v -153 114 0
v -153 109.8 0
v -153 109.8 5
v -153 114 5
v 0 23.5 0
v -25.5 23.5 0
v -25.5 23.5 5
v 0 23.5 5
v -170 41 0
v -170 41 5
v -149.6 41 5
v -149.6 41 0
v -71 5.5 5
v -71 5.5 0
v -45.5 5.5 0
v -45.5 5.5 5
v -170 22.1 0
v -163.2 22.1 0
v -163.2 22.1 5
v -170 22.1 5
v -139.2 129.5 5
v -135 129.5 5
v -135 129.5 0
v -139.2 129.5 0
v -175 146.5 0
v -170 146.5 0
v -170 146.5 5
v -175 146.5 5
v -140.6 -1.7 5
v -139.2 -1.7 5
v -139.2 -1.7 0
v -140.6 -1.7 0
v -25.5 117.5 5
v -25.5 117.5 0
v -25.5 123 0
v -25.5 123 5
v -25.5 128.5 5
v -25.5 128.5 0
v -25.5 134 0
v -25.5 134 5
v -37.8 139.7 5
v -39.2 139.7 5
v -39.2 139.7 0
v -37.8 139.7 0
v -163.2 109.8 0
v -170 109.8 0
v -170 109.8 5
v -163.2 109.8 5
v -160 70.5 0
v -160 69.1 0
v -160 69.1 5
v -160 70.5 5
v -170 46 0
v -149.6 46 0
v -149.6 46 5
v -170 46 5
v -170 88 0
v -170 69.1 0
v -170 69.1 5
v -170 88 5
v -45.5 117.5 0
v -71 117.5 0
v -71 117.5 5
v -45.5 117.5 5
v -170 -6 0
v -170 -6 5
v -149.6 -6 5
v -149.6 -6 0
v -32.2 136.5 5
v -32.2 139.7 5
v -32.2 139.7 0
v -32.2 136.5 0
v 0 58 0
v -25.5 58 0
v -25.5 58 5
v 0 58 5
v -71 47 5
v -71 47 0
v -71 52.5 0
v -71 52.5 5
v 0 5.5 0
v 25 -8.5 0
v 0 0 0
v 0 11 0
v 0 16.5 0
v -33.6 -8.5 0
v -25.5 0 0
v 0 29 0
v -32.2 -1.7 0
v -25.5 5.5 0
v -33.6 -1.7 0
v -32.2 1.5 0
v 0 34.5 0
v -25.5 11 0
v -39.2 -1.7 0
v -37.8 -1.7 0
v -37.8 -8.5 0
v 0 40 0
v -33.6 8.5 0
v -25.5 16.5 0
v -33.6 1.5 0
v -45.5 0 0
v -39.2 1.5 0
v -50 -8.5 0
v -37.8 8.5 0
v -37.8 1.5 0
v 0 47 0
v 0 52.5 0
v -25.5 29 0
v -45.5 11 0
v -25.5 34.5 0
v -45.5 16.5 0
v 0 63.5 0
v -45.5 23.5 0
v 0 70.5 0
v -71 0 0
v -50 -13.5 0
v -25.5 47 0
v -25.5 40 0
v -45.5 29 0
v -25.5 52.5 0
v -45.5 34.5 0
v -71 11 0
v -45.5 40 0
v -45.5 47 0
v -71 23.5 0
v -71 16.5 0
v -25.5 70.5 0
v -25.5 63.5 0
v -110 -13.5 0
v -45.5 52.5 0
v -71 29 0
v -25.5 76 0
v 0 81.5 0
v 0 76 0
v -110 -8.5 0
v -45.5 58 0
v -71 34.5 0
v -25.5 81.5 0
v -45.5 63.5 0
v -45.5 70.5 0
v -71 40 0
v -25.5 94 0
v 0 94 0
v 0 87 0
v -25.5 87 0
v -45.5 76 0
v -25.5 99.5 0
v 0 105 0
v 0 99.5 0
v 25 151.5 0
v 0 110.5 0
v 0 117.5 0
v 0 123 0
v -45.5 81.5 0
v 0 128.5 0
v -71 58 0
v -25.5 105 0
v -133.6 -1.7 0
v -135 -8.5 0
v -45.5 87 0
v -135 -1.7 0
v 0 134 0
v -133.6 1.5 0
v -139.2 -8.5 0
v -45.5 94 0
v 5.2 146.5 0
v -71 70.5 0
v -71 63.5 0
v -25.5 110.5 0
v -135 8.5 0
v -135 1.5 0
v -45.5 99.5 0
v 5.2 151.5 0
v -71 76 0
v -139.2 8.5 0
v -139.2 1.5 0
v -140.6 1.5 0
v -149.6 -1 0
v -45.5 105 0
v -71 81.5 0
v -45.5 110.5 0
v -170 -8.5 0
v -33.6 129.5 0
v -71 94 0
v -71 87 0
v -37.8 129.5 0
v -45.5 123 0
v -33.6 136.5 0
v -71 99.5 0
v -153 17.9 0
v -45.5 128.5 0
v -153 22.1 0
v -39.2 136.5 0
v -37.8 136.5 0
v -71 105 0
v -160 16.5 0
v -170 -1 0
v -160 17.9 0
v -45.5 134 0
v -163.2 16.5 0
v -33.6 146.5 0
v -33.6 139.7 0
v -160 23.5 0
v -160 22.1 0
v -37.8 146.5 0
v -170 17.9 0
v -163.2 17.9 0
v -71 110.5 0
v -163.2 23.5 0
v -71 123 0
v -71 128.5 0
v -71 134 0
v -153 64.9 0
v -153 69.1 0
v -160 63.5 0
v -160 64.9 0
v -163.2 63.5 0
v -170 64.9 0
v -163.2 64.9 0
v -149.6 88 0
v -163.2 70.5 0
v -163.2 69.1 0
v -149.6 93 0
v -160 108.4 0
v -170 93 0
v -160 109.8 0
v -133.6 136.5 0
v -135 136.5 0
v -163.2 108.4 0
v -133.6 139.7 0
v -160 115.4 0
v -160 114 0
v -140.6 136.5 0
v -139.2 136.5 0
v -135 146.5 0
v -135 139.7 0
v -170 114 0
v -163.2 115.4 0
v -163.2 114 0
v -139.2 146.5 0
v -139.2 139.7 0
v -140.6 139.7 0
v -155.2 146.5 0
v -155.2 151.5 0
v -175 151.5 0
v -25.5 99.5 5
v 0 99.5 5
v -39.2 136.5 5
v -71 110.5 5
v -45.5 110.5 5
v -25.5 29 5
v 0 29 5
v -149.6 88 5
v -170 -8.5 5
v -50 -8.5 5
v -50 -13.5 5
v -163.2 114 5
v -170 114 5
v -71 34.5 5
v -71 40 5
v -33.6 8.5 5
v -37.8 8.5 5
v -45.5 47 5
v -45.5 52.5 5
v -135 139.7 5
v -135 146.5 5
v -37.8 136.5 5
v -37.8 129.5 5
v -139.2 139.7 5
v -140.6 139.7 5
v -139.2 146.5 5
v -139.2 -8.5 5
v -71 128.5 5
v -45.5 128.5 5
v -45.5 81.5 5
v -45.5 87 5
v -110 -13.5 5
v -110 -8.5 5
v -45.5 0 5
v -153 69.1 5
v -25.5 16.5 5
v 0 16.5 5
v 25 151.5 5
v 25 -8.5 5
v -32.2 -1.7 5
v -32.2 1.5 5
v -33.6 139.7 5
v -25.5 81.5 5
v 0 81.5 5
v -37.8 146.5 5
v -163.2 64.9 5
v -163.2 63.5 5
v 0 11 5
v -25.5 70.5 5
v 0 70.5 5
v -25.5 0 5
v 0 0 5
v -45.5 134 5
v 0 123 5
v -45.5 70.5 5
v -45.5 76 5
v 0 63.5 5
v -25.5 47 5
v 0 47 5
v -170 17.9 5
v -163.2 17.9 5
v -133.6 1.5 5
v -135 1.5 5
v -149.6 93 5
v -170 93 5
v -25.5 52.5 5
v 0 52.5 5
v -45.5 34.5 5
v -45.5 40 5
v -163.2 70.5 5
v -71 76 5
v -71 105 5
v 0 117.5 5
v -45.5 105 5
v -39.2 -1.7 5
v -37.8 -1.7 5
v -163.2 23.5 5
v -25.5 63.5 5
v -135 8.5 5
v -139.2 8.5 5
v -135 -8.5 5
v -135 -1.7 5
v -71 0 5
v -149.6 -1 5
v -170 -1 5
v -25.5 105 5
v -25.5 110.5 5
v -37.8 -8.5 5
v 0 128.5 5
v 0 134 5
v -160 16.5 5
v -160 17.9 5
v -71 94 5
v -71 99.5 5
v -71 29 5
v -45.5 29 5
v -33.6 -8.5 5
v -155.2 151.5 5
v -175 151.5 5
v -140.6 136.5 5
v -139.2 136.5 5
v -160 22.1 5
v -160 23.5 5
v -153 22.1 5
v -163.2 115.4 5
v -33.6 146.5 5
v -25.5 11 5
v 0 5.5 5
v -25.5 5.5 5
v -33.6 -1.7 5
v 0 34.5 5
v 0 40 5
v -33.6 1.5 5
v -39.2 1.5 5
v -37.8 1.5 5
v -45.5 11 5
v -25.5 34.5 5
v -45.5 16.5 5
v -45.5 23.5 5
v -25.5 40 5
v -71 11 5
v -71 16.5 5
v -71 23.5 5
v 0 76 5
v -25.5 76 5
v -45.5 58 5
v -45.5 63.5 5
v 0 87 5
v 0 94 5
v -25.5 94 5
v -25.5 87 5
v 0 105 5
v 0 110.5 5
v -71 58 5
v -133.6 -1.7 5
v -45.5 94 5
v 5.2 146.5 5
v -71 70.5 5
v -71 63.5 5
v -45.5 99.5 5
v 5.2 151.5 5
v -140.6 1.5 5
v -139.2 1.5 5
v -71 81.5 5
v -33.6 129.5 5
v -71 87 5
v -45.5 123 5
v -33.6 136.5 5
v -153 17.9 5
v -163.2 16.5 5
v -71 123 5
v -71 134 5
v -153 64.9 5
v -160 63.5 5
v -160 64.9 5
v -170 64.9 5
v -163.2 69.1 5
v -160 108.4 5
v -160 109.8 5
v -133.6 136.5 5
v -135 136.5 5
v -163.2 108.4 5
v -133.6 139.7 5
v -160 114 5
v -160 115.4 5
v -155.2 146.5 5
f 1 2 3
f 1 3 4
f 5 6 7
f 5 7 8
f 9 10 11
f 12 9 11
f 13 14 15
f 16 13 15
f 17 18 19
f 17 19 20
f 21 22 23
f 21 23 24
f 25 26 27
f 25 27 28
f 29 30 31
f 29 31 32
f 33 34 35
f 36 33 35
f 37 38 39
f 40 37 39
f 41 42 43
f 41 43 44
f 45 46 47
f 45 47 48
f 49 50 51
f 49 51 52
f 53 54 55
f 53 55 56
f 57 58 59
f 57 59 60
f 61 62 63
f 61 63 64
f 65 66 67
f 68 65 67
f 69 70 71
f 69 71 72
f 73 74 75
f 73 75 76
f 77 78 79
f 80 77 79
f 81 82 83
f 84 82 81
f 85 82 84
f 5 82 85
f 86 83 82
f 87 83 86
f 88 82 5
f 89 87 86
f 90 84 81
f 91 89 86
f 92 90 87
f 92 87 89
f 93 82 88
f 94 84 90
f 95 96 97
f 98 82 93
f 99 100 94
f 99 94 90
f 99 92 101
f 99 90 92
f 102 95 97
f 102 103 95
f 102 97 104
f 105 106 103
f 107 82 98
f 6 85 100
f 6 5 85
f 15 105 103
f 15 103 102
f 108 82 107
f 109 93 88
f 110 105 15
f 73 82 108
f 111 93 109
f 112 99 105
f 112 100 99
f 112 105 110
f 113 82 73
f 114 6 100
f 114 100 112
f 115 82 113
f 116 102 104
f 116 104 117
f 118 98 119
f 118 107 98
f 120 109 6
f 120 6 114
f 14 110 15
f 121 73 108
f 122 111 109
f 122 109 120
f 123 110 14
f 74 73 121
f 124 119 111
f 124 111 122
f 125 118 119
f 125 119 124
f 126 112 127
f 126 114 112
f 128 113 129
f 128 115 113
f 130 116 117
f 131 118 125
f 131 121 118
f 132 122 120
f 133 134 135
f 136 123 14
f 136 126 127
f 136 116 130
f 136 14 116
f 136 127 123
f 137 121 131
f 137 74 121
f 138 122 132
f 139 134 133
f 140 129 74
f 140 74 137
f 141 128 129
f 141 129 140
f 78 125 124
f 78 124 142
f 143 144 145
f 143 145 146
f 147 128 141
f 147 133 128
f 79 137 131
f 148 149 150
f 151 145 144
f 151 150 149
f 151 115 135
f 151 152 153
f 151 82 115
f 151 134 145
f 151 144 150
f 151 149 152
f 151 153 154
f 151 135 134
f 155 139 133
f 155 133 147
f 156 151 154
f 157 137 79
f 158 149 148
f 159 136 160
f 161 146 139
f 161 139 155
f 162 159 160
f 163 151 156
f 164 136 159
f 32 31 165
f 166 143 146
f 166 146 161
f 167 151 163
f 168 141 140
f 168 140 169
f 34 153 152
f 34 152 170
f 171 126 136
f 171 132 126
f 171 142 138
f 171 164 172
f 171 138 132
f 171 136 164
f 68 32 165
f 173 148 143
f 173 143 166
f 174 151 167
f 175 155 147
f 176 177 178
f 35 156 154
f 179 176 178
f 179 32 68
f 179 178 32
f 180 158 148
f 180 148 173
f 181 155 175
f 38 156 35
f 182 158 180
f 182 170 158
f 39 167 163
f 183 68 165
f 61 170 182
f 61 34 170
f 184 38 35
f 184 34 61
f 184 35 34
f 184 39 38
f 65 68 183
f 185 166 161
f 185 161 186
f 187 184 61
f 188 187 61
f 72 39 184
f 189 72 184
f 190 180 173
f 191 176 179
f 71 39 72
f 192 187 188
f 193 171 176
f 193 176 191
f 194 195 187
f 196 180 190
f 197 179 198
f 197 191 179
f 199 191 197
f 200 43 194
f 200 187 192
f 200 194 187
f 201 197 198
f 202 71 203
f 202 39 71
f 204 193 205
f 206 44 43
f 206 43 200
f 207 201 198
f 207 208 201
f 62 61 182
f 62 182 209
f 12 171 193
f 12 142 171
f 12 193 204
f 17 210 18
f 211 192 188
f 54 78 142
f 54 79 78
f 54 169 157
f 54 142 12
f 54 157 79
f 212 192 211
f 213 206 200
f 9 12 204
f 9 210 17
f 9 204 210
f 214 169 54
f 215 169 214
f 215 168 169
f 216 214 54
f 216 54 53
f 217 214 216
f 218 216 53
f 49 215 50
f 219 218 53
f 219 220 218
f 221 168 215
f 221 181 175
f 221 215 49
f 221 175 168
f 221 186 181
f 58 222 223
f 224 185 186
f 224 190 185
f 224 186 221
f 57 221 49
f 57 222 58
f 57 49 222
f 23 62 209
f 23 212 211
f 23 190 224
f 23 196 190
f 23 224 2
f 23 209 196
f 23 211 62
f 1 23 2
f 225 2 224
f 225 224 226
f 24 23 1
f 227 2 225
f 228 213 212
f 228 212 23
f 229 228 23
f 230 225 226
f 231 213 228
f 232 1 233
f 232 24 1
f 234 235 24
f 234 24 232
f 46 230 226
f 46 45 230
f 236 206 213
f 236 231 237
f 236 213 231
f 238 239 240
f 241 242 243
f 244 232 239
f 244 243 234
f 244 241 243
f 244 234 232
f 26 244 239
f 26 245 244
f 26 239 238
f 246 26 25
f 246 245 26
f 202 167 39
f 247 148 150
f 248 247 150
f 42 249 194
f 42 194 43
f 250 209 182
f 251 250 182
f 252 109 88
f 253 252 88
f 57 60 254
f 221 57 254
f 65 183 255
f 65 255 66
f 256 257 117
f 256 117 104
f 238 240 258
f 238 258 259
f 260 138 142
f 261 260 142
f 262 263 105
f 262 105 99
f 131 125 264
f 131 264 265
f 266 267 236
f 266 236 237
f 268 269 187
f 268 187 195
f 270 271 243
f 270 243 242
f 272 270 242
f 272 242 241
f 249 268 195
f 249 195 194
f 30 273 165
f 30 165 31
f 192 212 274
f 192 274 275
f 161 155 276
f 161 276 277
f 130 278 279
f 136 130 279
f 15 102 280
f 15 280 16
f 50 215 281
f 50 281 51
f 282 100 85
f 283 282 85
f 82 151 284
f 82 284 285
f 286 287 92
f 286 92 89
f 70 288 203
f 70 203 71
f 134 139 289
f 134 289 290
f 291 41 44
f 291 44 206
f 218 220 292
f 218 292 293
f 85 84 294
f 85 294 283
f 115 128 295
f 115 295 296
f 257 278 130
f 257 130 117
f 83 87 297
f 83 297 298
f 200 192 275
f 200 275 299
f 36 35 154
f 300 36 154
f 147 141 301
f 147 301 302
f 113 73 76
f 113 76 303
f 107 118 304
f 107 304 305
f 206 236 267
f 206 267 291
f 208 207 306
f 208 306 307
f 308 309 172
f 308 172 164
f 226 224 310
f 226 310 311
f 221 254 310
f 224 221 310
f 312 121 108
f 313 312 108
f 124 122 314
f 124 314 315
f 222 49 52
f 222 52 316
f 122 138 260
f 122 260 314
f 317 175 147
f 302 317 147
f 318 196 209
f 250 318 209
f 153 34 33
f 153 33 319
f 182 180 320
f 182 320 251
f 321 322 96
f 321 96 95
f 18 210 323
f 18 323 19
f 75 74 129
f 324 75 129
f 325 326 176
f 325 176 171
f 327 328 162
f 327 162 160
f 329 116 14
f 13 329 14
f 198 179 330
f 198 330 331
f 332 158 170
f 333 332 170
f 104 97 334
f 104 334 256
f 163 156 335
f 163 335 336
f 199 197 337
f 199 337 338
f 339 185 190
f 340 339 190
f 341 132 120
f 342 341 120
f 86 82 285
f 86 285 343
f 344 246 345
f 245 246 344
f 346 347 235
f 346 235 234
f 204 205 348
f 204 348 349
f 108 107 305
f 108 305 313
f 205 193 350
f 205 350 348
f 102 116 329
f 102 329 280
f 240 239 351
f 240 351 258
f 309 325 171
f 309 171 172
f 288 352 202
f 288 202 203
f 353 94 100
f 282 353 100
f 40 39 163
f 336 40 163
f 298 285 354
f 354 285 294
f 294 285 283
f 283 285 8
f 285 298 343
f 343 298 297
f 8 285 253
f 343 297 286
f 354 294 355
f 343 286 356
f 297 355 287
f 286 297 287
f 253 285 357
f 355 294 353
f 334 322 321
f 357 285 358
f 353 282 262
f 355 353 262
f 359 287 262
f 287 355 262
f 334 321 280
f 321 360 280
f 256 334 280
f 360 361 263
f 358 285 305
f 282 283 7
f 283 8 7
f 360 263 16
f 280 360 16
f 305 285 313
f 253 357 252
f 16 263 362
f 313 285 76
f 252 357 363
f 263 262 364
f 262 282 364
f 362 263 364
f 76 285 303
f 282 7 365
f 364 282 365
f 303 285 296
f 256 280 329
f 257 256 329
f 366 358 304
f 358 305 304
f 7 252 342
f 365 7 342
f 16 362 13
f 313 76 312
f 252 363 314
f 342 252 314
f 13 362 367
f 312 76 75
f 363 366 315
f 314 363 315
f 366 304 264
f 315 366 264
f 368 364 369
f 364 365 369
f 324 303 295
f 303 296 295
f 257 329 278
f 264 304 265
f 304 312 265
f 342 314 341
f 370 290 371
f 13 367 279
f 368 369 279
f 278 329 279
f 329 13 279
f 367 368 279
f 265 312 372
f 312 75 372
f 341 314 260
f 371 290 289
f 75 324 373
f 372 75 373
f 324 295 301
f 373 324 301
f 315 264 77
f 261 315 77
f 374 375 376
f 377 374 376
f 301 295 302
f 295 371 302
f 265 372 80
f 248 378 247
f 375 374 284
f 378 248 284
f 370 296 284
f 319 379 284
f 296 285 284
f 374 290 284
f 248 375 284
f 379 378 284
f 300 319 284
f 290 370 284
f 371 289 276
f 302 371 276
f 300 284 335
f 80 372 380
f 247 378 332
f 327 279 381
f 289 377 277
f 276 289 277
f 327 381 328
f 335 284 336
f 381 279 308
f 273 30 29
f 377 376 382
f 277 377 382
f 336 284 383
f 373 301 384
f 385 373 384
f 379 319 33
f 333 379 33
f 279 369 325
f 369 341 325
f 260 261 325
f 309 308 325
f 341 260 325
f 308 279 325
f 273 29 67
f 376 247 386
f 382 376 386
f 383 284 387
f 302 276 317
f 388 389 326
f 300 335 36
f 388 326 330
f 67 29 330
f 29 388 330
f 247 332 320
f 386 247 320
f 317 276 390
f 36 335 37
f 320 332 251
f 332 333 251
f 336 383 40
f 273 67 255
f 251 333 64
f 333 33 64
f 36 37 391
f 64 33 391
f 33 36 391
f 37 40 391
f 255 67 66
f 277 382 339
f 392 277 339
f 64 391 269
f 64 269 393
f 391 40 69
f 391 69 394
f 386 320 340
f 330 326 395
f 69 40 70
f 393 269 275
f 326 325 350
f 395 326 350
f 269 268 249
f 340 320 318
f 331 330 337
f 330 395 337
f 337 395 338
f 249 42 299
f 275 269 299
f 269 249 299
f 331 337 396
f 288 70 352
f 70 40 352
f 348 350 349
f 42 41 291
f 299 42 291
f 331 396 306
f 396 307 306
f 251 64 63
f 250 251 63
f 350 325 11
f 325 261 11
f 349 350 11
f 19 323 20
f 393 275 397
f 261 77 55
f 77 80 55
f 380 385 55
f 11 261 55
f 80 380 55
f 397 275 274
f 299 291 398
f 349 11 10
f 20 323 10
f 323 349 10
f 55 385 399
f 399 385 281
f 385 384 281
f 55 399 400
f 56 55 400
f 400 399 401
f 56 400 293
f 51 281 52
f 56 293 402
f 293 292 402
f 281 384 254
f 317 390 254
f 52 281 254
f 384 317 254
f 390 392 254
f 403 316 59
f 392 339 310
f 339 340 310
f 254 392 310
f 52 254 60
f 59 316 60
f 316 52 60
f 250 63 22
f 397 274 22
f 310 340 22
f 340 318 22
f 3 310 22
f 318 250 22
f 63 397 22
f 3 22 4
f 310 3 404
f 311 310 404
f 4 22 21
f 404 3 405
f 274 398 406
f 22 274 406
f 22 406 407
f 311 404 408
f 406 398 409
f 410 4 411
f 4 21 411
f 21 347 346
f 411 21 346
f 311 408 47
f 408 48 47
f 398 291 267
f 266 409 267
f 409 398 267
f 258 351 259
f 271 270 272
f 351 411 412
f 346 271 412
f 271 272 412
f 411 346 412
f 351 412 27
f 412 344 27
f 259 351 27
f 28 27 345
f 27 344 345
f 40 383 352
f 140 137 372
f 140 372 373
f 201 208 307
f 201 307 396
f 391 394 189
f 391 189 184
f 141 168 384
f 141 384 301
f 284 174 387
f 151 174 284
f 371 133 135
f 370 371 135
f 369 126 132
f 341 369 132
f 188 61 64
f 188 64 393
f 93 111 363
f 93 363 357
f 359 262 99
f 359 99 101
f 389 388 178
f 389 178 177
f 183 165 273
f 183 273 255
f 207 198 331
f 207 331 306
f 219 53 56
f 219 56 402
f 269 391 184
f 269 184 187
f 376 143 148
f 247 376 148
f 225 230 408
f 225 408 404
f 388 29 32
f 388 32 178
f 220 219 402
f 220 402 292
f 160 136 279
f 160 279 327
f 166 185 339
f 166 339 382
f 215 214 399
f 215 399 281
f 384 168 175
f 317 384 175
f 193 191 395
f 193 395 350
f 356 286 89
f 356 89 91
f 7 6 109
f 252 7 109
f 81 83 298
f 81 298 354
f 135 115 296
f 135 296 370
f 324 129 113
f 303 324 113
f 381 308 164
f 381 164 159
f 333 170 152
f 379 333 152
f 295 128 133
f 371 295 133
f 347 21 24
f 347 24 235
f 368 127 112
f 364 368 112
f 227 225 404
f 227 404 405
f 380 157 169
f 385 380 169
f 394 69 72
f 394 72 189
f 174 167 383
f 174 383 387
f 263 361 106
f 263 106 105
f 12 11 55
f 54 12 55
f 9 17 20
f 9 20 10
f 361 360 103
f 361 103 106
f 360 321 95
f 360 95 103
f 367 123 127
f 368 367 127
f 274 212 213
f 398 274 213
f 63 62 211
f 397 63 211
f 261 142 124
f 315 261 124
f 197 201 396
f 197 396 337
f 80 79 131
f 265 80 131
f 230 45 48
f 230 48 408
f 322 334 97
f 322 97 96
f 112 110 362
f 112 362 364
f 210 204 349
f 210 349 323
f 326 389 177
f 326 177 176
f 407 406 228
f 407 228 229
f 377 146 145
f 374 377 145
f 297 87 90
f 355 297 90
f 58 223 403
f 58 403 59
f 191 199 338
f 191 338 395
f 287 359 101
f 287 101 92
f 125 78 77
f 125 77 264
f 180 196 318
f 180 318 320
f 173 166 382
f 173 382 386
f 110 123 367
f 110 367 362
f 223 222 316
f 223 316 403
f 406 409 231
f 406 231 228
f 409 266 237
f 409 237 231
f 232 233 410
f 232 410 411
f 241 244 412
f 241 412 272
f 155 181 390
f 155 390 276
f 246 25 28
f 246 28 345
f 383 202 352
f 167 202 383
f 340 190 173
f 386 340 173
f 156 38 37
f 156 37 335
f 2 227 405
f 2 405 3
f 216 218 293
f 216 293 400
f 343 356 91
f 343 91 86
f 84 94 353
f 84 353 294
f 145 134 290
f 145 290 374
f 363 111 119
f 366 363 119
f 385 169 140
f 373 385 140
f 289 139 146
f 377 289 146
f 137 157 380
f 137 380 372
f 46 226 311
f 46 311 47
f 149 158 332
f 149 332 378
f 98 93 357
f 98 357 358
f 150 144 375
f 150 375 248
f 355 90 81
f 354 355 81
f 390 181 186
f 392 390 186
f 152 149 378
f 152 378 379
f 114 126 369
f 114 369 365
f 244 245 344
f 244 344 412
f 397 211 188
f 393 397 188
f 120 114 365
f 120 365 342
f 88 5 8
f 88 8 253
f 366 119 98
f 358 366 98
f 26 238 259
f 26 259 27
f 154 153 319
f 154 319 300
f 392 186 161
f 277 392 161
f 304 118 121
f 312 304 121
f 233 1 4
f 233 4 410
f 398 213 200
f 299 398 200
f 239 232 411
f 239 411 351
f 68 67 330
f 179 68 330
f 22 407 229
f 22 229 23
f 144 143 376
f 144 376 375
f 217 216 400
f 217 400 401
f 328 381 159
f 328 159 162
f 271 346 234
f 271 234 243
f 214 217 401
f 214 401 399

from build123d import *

# Parameters (mm, degrees)
SKETCH1_W           = 25.5
SKETCH1_H           = 5.5
BOSS_EXTRUDE1_DEPTH = 5
CUT_EXTRUDE3_DEPTH  = 10
SKETCH5_W           = 60
SKETCH5_H           = 5
BOSS_EXTRUDE2_DEPTH = 5
SKETCH6_W           = 20.4
SKETCH6_H           = 5
CUT_EXTRUDE4_DEPTH  = 10


with BuildPart() as part:
    # Sketch1 → Boss-Extrude1 (new body)
    with BuildSketch(Plane.XY):
        Polygon((-155.2, 151.5), (-155.2, 146.5), (5.2, 146.5), (5.2, 151.5), (25, 151.5), (25, -8.5), (-170, -8.5), (-170, -6), (-150, -6), (-150, -1), (-170, -1), (-170, 17.9), (-163.2, 17.9), (-163.2, 16.5), (-160, 16.5), (-160, 17.9), (-153, 17.9), (-153, 22.1), (-160, 22.1), (-160, 23.5), (-163.2, 23.5), (-163.2, 22.1), (-170, 22.1), (-170, 41), (-150, 41), (-150, 46), (-170, 46), (-170, 64.9), (-163.2, 64.9), (-163.2, 63.5), (-160, 63.5), (-160, 64.9), (-153, 64.9), (-153, 69.1), (-160, 69.1), (-160, 70.5), (-163.2, 70.5), (-163.2, 69.1), (-170, 69.1), (-170, 88), (-150, 88), (-150, 93), (-170, 93), (-170, 109.8), (-163.2, 109.8), (-163.2, 108.4), (-160, 108.4), (-160, 109.8), (-153, 109.8), (-153, 114), (-160, 114), (-160, 115.4), (-163.2, 115.4), (-163.2, 114), (-170, 114), (-170, 146.5), (-175, 146.5), (-175, 151.5), align=None)
        with Locations((-58.25, 13.75)):
            Rectangle(SKETCH1_W, SKETCH1_H, mode=Mode.SUBTRACT)
        with Locations((-12.75, 2.75)):
            Rectangle(SKETCH1_W, SKETCH1_H, mode=Mode.SUBTRACT)
        with Locations((-58.25, 2.75)):
            Rectangle(SKETCH1_W, SKETCH1_H, mode=Mode.SUBTRACT)
        with Locations((-12.75, 13.75)):
            Rectangle(SKETCH1_W, SKETCH1_H, mode=Mode.SUBTRACT)
        with Locations((-12.75, 26.25)):
            Rectangle(SKETCH1_W, SKETCH1_H, mode=Mode.SUBTRACT)
        with Locations((-58.25, 26.25)):
            Rectangle(SKETCH1_W, SKETCH1_H, mode=Mode.SUBTRACT)
        with Locations((-58.25, 37.25)):
            Rectangle(SKETCH1_W, SKETCH1_H, mode=Mode.SUBTRACT)
        with Locations((-12.75, 37.25)):
            Rectangle(SKETCH1_W, SKETCH1_H, mode=Mode.SUBTRACT)
        with Locations((-12.75, 49.75)):
            Rectangle(SKETCH1_W, SKETCH1_H, mode=Mode.SUBTRACT)
        with Locations((-58.25, 49.75)):
            Rectangle(SKETCH1_W, SKETCH1_H, mode=Mode.SUBTRACT)
        with Locations((-58.25, 60.75)):
            Rectangle(SKETCH1_W, SKETCH1_H, mode=Mode.SUBTRACT)
        with Locations((-12.75, 60.75)):
            Rectangle(SKETCH1_W, SKETCH1_H, mode=Mode.SUBTRACT)
        with Locations((-12.75, 73.25)):
            Rectangle(SKETCH1_W, SKETCH1_H, mode=Mode.SUBTRACT)
        with Locations((-58.25, 73.25)):
            Rectangle(SKETCH1_W, SKETCH1_H, mode=Mode.SUBTRACT)
        with Locations((-58.25, 84.25)):
            Rectangle(SKETCH1_W, SKETCH1_H, mode=Mode.SUBTRACT)
        with Locations((-12.75, 84.25)):
            Rectangle(SKETCH1_W, SKETCH1_H, mode=Mode.SUBTRACT)
        with Locations((-12.75, 96.75)):
            Rectangle(SKETCH1_W, SKETCH1_H, mode=Mode.SUBTRACT)
        with Locations((-58.25, 96.75)):
            Rectangle(SKETCH1_W, SKETCH1_H, mode=Mode.SUBTRACT)
        with Locations((-58.25, 107.75)):
            Rectangle(SKETCH1_W, SKETCH1_H, mode=Mode.SUBTRACT)
        with Locations((-12.75, 107.75)):
            Rectangle(SKETCH1_W, SKETCH1_H, mode=Mode.SUBTRACT)
        with Locations((-12.75, 120.25)):
            Rectangle(SKETCH1_W, SKETCH1_H, mode=Mode.SUBTRACT)
        with Locations((-58.25, 120.25)):
            Rectangle(SKETCH1_W, SKETCH1_H, mode=Mode.SUBTRACT)
        with Locations((-58.25, 131.25)):
            Rectangle(SKETCH1_W, SKETCH1_H, mode=Mode.SUBTRACT)
        with Locations((-12.75, 131.25)):
            Rectangle(SKETCH1_W, SKETCH1_H, mode=Mode.SUBTRACT)
    extrude(amount=BOSS_EXTRUDE1_DEPTH)

    # Sketch4 → Cut-Extrude3 (cut)
    with BuildSketch(Plane.XY.offset(5)):
        Polygon((-33.6, 146.5), (-33.6, 139.7), (-32.2, 139.7), (-32.2, 136.5), (-33.6, 136.5), (-33.6, 129.5), (-37.8, 129.5), (-37.8, 136.5), (-39.2, 136.5), (-39.2, 139.7), (-37.8, 139.7), (-37.8, 146.5), align=None)
        Polygon((-135, 129.5), (-139.2, 129.5), (-139.2, 136.5), (-140.6, 136.5), (-140.6, 139.7), (-139.2, 139.7), (-139.2, 146.5), (-135, 146.5), (-135, 139.7), (-133.6, 139.7), (-133.6, 136.5), (-135, 136.5), align=None)
        Polygon((-33.6, -8.5), (-37.8, -8.5), (-37.8, -1.7), (-39.2, -1.7), (-39.2, 1.5), (-37.8, 1.5), (-37.8, 8.5), (-33.6, 8.5), (-33.6, 1.5), (-32.2, 1.5), (-32.2, -1.7), (-33.6, -1.7), align=None)
        Polygon((-135, -8.5), (-139.2, -8.5), (-139.2, -1.7), (-140.6, -1.7), (-140.6, 1.5), (-139.2, 1.5), (-139.2, 8.5), (-135, 8.5), (-135, 1.5), (-133.6, 1.5), (-133.6, -1.7), (-135, -1.7), align=None)
    extrude(amount=-CUT_EXTRUDE3_DEPTH, mode=Mode.SUBTRACT)

    # Sketch5 → Boss-Extrude2 (add)
    with BuildSketch(Plane.XY.offset(5)):
        with Locations((-80, -11)):
            Rectangle(SKETCH5_W, SKETCH5_H)
    extrude(amount=-BOSS_EXTRUDE2_DEPTH)

    # Sketch6 → Cut-Extrude4 (cut)
    with BuildSketch(Plane.XY.offset(5)):
        with Locations((-159.8, -3.5)):
            Rectangle(SKETCH6_W, SKETCH6_H)
        with Locations((-159.8, 43.5)):
            Rectangle(SKETCH6_W, SKETCH6_H)
        with Locations((-159.8, 90.5)):
            Rectangle(SKETCH6_W, SKETCH6_H)
    extrude(amount=-CUT_EXTRUDE4_DEPTH, mode=Mode.SUBTRACT)


solid = part.part
